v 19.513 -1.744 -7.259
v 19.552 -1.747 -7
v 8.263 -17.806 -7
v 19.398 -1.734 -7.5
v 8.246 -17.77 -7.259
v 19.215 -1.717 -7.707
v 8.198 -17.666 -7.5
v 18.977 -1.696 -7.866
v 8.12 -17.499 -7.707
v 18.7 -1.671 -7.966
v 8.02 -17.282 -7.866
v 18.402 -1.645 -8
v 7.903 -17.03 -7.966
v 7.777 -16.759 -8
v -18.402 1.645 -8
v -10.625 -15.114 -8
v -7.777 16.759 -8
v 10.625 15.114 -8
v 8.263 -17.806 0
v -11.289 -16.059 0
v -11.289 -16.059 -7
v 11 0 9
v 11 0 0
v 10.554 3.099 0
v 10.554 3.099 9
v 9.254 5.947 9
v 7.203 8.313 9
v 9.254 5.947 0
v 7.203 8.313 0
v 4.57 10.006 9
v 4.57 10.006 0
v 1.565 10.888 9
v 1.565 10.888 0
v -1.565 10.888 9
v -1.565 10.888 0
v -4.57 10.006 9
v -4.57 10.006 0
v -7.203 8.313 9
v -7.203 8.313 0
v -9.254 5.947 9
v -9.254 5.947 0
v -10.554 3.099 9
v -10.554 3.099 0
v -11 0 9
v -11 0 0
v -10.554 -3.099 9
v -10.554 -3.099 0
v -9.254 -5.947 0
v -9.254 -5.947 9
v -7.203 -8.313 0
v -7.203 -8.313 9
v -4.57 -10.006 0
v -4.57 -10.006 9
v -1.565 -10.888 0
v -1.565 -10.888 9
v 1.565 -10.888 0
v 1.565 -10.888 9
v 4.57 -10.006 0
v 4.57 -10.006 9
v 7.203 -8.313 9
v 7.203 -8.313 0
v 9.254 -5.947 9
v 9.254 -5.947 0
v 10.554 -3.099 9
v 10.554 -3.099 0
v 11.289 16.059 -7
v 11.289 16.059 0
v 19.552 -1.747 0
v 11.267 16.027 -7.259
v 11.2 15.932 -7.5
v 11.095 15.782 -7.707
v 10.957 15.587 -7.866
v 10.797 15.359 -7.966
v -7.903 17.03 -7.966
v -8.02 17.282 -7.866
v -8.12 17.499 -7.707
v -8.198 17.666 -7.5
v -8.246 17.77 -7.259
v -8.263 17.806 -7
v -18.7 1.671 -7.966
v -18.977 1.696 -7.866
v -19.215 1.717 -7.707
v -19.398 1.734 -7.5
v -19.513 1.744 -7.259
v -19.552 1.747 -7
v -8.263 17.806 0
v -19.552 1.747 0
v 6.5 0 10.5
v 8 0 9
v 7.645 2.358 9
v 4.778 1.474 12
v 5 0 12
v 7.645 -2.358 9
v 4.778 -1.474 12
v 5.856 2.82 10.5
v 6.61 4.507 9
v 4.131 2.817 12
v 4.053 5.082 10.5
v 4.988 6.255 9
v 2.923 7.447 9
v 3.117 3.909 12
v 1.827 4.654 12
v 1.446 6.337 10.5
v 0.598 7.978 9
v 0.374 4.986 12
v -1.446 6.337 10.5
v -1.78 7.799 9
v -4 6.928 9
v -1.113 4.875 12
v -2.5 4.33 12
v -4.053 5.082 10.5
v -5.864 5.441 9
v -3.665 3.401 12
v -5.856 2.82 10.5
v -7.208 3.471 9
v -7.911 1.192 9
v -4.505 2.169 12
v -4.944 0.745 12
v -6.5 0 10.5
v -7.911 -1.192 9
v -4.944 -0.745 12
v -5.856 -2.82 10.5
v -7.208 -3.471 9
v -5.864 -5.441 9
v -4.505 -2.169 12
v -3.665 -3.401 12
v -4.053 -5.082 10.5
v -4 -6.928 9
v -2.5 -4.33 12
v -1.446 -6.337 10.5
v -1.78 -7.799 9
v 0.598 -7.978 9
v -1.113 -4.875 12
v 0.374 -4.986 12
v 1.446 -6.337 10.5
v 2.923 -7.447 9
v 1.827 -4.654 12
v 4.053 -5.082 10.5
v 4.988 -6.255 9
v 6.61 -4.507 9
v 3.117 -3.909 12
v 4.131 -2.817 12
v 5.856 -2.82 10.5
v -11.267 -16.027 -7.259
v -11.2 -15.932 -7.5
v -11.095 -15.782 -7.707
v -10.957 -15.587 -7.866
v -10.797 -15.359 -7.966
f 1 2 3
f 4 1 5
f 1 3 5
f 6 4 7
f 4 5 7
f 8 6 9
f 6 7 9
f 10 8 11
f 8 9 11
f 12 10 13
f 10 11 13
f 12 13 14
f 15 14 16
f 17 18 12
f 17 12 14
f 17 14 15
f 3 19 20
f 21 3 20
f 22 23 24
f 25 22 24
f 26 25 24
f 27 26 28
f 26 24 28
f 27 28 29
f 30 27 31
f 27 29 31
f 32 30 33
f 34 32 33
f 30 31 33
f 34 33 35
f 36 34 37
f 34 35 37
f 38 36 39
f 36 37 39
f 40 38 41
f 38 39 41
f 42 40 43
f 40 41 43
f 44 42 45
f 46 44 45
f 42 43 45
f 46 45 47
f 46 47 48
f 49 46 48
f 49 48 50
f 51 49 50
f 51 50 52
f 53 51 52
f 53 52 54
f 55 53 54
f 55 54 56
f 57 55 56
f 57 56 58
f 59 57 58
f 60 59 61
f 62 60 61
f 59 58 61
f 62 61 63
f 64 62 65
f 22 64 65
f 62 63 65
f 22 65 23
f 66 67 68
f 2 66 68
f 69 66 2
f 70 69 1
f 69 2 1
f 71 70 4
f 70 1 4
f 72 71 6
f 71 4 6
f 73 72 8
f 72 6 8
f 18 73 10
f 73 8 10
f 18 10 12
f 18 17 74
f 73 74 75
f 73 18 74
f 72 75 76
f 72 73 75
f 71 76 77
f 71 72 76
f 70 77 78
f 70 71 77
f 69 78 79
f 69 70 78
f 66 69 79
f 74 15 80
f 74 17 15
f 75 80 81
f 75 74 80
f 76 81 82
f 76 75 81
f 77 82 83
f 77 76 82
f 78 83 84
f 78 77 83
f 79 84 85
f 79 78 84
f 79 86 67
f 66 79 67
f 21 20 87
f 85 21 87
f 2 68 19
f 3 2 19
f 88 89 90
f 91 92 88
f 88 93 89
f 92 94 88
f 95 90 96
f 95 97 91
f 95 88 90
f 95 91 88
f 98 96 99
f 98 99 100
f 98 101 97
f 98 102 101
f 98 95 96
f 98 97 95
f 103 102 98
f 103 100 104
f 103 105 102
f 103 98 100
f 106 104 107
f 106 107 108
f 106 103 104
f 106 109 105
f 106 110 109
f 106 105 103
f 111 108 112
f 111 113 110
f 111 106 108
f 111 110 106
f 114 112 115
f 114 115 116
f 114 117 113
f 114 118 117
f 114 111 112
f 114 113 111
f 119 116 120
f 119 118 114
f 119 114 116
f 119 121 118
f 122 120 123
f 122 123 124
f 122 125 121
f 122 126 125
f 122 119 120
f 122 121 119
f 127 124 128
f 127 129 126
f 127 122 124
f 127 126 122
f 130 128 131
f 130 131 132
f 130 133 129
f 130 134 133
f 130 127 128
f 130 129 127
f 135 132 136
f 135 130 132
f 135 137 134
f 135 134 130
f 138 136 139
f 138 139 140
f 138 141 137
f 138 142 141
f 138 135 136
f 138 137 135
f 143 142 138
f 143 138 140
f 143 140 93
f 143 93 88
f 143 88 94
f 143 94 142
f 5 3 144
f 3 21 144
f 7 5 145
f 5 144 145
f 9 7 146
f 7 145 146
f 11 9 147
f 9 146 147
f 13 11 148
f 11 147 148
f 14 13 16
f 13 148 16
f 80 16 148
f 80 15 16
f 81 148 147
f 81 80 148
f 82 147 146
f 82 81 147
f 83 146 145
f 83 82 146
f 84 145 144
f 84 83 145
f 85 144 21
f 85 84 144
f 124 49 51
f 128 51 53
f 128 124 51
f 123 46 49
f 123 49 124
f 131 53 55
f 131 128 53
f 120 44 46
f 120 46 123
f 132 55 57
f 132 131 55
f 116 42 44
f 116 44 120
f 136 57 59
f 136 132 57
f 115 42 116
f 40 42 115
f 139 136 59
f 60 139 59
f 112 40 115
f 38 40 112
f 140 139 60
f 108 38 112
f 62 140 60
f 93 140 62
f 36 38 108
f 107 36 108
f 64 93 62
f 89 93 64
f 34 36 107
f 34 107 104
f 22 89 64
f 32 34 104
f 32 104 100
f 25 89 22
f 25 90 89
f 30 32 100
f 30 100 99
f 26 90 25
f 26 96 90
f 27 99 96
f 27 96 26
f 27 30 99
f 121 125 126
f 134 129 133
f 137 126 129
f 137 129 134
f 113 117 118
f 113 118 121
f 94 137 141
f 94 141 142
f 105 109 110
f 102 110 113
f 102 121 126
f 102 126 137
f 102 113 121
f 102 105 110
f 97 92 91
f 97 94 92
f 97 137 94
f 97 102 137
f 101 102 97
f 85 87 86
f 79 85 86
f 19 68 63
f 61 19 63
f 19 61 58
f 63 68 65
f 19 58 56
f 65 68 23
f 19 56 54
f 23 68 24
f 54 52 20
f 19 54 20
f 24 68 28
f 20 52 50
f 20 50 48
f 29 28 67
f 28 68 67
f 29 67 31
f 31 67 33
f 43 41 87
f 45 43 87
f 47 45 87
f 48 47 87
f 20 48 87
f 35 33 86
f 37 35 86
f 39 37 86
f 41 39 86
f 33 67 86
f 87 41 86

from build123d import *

# Parameters (mm, degrees)
SCHIZZO1_R                   = 11
ESTRUSIONE_ESTRUSIONE1_DEPTH = 9
ESTRUSIONE_ESTRUSIONE2_DEPTH = 8
RACCORDO1_R                  = 1
SCHIZZO5_R                   = 8
SCHIZZO4_R                   = 5


with BuildPart() as part:
    # Schizzo1 → Estrusione-Estrusione1 (new body)
    with BuildSketch(Plane.XY):
        Circle(SCHIZZO1_R)
    extrude(amount=ESTRUSIONE_ESTRUSIONE1_DEPTH)

    # Schizzo2 → Estrusione-Estrusione2 (add)
    with BuildSketch(Plane(origin=(0, 0, 0), x_dir=(-1, 0, 0), z_dir=(0, 0, -1))):
        Polygon((-19.551988484, -1.747306402), (-8.26278251, -17.806171922), (11.289205974, -16.058865521), (19.551988484, 1.747306402), (8.26278251, 17.806171922), (-11.289205974, 16.058865521), align=None)
    extrude(amount=ESTRUSIONE_ESTRUSIONE2_DEPTH)

    # Raccordo1
    raccordo1_edges = [part.edges().sort_by_distance(p)[0] for p in [
        (1.513211732, 16.932518721, -8),
        (15.420597229, 7.155779559, -8),
        (13.907385497, -9.776739162, -8),
        (-1.513211732, -16.932518721, -8),
        (-15.420597229, -7.155779559, -8),
        (-13.907385497, 9.776739162, -8),
    ]]
    fillet(raccordo1_edges, radius=RACCORDO1_R)

    # Schizzo5 → Loft1 section 0
    with BuildSketch(Plane.XY.offset(9)):
        Circle(SCHIZZO5_R)
    # Schizzo4 → Loft1 section 1
    with BuildSketch(Plane.XY.offset(12)):
        Circle(SCHIZZO4_R)
    loft()


solid = part.part
